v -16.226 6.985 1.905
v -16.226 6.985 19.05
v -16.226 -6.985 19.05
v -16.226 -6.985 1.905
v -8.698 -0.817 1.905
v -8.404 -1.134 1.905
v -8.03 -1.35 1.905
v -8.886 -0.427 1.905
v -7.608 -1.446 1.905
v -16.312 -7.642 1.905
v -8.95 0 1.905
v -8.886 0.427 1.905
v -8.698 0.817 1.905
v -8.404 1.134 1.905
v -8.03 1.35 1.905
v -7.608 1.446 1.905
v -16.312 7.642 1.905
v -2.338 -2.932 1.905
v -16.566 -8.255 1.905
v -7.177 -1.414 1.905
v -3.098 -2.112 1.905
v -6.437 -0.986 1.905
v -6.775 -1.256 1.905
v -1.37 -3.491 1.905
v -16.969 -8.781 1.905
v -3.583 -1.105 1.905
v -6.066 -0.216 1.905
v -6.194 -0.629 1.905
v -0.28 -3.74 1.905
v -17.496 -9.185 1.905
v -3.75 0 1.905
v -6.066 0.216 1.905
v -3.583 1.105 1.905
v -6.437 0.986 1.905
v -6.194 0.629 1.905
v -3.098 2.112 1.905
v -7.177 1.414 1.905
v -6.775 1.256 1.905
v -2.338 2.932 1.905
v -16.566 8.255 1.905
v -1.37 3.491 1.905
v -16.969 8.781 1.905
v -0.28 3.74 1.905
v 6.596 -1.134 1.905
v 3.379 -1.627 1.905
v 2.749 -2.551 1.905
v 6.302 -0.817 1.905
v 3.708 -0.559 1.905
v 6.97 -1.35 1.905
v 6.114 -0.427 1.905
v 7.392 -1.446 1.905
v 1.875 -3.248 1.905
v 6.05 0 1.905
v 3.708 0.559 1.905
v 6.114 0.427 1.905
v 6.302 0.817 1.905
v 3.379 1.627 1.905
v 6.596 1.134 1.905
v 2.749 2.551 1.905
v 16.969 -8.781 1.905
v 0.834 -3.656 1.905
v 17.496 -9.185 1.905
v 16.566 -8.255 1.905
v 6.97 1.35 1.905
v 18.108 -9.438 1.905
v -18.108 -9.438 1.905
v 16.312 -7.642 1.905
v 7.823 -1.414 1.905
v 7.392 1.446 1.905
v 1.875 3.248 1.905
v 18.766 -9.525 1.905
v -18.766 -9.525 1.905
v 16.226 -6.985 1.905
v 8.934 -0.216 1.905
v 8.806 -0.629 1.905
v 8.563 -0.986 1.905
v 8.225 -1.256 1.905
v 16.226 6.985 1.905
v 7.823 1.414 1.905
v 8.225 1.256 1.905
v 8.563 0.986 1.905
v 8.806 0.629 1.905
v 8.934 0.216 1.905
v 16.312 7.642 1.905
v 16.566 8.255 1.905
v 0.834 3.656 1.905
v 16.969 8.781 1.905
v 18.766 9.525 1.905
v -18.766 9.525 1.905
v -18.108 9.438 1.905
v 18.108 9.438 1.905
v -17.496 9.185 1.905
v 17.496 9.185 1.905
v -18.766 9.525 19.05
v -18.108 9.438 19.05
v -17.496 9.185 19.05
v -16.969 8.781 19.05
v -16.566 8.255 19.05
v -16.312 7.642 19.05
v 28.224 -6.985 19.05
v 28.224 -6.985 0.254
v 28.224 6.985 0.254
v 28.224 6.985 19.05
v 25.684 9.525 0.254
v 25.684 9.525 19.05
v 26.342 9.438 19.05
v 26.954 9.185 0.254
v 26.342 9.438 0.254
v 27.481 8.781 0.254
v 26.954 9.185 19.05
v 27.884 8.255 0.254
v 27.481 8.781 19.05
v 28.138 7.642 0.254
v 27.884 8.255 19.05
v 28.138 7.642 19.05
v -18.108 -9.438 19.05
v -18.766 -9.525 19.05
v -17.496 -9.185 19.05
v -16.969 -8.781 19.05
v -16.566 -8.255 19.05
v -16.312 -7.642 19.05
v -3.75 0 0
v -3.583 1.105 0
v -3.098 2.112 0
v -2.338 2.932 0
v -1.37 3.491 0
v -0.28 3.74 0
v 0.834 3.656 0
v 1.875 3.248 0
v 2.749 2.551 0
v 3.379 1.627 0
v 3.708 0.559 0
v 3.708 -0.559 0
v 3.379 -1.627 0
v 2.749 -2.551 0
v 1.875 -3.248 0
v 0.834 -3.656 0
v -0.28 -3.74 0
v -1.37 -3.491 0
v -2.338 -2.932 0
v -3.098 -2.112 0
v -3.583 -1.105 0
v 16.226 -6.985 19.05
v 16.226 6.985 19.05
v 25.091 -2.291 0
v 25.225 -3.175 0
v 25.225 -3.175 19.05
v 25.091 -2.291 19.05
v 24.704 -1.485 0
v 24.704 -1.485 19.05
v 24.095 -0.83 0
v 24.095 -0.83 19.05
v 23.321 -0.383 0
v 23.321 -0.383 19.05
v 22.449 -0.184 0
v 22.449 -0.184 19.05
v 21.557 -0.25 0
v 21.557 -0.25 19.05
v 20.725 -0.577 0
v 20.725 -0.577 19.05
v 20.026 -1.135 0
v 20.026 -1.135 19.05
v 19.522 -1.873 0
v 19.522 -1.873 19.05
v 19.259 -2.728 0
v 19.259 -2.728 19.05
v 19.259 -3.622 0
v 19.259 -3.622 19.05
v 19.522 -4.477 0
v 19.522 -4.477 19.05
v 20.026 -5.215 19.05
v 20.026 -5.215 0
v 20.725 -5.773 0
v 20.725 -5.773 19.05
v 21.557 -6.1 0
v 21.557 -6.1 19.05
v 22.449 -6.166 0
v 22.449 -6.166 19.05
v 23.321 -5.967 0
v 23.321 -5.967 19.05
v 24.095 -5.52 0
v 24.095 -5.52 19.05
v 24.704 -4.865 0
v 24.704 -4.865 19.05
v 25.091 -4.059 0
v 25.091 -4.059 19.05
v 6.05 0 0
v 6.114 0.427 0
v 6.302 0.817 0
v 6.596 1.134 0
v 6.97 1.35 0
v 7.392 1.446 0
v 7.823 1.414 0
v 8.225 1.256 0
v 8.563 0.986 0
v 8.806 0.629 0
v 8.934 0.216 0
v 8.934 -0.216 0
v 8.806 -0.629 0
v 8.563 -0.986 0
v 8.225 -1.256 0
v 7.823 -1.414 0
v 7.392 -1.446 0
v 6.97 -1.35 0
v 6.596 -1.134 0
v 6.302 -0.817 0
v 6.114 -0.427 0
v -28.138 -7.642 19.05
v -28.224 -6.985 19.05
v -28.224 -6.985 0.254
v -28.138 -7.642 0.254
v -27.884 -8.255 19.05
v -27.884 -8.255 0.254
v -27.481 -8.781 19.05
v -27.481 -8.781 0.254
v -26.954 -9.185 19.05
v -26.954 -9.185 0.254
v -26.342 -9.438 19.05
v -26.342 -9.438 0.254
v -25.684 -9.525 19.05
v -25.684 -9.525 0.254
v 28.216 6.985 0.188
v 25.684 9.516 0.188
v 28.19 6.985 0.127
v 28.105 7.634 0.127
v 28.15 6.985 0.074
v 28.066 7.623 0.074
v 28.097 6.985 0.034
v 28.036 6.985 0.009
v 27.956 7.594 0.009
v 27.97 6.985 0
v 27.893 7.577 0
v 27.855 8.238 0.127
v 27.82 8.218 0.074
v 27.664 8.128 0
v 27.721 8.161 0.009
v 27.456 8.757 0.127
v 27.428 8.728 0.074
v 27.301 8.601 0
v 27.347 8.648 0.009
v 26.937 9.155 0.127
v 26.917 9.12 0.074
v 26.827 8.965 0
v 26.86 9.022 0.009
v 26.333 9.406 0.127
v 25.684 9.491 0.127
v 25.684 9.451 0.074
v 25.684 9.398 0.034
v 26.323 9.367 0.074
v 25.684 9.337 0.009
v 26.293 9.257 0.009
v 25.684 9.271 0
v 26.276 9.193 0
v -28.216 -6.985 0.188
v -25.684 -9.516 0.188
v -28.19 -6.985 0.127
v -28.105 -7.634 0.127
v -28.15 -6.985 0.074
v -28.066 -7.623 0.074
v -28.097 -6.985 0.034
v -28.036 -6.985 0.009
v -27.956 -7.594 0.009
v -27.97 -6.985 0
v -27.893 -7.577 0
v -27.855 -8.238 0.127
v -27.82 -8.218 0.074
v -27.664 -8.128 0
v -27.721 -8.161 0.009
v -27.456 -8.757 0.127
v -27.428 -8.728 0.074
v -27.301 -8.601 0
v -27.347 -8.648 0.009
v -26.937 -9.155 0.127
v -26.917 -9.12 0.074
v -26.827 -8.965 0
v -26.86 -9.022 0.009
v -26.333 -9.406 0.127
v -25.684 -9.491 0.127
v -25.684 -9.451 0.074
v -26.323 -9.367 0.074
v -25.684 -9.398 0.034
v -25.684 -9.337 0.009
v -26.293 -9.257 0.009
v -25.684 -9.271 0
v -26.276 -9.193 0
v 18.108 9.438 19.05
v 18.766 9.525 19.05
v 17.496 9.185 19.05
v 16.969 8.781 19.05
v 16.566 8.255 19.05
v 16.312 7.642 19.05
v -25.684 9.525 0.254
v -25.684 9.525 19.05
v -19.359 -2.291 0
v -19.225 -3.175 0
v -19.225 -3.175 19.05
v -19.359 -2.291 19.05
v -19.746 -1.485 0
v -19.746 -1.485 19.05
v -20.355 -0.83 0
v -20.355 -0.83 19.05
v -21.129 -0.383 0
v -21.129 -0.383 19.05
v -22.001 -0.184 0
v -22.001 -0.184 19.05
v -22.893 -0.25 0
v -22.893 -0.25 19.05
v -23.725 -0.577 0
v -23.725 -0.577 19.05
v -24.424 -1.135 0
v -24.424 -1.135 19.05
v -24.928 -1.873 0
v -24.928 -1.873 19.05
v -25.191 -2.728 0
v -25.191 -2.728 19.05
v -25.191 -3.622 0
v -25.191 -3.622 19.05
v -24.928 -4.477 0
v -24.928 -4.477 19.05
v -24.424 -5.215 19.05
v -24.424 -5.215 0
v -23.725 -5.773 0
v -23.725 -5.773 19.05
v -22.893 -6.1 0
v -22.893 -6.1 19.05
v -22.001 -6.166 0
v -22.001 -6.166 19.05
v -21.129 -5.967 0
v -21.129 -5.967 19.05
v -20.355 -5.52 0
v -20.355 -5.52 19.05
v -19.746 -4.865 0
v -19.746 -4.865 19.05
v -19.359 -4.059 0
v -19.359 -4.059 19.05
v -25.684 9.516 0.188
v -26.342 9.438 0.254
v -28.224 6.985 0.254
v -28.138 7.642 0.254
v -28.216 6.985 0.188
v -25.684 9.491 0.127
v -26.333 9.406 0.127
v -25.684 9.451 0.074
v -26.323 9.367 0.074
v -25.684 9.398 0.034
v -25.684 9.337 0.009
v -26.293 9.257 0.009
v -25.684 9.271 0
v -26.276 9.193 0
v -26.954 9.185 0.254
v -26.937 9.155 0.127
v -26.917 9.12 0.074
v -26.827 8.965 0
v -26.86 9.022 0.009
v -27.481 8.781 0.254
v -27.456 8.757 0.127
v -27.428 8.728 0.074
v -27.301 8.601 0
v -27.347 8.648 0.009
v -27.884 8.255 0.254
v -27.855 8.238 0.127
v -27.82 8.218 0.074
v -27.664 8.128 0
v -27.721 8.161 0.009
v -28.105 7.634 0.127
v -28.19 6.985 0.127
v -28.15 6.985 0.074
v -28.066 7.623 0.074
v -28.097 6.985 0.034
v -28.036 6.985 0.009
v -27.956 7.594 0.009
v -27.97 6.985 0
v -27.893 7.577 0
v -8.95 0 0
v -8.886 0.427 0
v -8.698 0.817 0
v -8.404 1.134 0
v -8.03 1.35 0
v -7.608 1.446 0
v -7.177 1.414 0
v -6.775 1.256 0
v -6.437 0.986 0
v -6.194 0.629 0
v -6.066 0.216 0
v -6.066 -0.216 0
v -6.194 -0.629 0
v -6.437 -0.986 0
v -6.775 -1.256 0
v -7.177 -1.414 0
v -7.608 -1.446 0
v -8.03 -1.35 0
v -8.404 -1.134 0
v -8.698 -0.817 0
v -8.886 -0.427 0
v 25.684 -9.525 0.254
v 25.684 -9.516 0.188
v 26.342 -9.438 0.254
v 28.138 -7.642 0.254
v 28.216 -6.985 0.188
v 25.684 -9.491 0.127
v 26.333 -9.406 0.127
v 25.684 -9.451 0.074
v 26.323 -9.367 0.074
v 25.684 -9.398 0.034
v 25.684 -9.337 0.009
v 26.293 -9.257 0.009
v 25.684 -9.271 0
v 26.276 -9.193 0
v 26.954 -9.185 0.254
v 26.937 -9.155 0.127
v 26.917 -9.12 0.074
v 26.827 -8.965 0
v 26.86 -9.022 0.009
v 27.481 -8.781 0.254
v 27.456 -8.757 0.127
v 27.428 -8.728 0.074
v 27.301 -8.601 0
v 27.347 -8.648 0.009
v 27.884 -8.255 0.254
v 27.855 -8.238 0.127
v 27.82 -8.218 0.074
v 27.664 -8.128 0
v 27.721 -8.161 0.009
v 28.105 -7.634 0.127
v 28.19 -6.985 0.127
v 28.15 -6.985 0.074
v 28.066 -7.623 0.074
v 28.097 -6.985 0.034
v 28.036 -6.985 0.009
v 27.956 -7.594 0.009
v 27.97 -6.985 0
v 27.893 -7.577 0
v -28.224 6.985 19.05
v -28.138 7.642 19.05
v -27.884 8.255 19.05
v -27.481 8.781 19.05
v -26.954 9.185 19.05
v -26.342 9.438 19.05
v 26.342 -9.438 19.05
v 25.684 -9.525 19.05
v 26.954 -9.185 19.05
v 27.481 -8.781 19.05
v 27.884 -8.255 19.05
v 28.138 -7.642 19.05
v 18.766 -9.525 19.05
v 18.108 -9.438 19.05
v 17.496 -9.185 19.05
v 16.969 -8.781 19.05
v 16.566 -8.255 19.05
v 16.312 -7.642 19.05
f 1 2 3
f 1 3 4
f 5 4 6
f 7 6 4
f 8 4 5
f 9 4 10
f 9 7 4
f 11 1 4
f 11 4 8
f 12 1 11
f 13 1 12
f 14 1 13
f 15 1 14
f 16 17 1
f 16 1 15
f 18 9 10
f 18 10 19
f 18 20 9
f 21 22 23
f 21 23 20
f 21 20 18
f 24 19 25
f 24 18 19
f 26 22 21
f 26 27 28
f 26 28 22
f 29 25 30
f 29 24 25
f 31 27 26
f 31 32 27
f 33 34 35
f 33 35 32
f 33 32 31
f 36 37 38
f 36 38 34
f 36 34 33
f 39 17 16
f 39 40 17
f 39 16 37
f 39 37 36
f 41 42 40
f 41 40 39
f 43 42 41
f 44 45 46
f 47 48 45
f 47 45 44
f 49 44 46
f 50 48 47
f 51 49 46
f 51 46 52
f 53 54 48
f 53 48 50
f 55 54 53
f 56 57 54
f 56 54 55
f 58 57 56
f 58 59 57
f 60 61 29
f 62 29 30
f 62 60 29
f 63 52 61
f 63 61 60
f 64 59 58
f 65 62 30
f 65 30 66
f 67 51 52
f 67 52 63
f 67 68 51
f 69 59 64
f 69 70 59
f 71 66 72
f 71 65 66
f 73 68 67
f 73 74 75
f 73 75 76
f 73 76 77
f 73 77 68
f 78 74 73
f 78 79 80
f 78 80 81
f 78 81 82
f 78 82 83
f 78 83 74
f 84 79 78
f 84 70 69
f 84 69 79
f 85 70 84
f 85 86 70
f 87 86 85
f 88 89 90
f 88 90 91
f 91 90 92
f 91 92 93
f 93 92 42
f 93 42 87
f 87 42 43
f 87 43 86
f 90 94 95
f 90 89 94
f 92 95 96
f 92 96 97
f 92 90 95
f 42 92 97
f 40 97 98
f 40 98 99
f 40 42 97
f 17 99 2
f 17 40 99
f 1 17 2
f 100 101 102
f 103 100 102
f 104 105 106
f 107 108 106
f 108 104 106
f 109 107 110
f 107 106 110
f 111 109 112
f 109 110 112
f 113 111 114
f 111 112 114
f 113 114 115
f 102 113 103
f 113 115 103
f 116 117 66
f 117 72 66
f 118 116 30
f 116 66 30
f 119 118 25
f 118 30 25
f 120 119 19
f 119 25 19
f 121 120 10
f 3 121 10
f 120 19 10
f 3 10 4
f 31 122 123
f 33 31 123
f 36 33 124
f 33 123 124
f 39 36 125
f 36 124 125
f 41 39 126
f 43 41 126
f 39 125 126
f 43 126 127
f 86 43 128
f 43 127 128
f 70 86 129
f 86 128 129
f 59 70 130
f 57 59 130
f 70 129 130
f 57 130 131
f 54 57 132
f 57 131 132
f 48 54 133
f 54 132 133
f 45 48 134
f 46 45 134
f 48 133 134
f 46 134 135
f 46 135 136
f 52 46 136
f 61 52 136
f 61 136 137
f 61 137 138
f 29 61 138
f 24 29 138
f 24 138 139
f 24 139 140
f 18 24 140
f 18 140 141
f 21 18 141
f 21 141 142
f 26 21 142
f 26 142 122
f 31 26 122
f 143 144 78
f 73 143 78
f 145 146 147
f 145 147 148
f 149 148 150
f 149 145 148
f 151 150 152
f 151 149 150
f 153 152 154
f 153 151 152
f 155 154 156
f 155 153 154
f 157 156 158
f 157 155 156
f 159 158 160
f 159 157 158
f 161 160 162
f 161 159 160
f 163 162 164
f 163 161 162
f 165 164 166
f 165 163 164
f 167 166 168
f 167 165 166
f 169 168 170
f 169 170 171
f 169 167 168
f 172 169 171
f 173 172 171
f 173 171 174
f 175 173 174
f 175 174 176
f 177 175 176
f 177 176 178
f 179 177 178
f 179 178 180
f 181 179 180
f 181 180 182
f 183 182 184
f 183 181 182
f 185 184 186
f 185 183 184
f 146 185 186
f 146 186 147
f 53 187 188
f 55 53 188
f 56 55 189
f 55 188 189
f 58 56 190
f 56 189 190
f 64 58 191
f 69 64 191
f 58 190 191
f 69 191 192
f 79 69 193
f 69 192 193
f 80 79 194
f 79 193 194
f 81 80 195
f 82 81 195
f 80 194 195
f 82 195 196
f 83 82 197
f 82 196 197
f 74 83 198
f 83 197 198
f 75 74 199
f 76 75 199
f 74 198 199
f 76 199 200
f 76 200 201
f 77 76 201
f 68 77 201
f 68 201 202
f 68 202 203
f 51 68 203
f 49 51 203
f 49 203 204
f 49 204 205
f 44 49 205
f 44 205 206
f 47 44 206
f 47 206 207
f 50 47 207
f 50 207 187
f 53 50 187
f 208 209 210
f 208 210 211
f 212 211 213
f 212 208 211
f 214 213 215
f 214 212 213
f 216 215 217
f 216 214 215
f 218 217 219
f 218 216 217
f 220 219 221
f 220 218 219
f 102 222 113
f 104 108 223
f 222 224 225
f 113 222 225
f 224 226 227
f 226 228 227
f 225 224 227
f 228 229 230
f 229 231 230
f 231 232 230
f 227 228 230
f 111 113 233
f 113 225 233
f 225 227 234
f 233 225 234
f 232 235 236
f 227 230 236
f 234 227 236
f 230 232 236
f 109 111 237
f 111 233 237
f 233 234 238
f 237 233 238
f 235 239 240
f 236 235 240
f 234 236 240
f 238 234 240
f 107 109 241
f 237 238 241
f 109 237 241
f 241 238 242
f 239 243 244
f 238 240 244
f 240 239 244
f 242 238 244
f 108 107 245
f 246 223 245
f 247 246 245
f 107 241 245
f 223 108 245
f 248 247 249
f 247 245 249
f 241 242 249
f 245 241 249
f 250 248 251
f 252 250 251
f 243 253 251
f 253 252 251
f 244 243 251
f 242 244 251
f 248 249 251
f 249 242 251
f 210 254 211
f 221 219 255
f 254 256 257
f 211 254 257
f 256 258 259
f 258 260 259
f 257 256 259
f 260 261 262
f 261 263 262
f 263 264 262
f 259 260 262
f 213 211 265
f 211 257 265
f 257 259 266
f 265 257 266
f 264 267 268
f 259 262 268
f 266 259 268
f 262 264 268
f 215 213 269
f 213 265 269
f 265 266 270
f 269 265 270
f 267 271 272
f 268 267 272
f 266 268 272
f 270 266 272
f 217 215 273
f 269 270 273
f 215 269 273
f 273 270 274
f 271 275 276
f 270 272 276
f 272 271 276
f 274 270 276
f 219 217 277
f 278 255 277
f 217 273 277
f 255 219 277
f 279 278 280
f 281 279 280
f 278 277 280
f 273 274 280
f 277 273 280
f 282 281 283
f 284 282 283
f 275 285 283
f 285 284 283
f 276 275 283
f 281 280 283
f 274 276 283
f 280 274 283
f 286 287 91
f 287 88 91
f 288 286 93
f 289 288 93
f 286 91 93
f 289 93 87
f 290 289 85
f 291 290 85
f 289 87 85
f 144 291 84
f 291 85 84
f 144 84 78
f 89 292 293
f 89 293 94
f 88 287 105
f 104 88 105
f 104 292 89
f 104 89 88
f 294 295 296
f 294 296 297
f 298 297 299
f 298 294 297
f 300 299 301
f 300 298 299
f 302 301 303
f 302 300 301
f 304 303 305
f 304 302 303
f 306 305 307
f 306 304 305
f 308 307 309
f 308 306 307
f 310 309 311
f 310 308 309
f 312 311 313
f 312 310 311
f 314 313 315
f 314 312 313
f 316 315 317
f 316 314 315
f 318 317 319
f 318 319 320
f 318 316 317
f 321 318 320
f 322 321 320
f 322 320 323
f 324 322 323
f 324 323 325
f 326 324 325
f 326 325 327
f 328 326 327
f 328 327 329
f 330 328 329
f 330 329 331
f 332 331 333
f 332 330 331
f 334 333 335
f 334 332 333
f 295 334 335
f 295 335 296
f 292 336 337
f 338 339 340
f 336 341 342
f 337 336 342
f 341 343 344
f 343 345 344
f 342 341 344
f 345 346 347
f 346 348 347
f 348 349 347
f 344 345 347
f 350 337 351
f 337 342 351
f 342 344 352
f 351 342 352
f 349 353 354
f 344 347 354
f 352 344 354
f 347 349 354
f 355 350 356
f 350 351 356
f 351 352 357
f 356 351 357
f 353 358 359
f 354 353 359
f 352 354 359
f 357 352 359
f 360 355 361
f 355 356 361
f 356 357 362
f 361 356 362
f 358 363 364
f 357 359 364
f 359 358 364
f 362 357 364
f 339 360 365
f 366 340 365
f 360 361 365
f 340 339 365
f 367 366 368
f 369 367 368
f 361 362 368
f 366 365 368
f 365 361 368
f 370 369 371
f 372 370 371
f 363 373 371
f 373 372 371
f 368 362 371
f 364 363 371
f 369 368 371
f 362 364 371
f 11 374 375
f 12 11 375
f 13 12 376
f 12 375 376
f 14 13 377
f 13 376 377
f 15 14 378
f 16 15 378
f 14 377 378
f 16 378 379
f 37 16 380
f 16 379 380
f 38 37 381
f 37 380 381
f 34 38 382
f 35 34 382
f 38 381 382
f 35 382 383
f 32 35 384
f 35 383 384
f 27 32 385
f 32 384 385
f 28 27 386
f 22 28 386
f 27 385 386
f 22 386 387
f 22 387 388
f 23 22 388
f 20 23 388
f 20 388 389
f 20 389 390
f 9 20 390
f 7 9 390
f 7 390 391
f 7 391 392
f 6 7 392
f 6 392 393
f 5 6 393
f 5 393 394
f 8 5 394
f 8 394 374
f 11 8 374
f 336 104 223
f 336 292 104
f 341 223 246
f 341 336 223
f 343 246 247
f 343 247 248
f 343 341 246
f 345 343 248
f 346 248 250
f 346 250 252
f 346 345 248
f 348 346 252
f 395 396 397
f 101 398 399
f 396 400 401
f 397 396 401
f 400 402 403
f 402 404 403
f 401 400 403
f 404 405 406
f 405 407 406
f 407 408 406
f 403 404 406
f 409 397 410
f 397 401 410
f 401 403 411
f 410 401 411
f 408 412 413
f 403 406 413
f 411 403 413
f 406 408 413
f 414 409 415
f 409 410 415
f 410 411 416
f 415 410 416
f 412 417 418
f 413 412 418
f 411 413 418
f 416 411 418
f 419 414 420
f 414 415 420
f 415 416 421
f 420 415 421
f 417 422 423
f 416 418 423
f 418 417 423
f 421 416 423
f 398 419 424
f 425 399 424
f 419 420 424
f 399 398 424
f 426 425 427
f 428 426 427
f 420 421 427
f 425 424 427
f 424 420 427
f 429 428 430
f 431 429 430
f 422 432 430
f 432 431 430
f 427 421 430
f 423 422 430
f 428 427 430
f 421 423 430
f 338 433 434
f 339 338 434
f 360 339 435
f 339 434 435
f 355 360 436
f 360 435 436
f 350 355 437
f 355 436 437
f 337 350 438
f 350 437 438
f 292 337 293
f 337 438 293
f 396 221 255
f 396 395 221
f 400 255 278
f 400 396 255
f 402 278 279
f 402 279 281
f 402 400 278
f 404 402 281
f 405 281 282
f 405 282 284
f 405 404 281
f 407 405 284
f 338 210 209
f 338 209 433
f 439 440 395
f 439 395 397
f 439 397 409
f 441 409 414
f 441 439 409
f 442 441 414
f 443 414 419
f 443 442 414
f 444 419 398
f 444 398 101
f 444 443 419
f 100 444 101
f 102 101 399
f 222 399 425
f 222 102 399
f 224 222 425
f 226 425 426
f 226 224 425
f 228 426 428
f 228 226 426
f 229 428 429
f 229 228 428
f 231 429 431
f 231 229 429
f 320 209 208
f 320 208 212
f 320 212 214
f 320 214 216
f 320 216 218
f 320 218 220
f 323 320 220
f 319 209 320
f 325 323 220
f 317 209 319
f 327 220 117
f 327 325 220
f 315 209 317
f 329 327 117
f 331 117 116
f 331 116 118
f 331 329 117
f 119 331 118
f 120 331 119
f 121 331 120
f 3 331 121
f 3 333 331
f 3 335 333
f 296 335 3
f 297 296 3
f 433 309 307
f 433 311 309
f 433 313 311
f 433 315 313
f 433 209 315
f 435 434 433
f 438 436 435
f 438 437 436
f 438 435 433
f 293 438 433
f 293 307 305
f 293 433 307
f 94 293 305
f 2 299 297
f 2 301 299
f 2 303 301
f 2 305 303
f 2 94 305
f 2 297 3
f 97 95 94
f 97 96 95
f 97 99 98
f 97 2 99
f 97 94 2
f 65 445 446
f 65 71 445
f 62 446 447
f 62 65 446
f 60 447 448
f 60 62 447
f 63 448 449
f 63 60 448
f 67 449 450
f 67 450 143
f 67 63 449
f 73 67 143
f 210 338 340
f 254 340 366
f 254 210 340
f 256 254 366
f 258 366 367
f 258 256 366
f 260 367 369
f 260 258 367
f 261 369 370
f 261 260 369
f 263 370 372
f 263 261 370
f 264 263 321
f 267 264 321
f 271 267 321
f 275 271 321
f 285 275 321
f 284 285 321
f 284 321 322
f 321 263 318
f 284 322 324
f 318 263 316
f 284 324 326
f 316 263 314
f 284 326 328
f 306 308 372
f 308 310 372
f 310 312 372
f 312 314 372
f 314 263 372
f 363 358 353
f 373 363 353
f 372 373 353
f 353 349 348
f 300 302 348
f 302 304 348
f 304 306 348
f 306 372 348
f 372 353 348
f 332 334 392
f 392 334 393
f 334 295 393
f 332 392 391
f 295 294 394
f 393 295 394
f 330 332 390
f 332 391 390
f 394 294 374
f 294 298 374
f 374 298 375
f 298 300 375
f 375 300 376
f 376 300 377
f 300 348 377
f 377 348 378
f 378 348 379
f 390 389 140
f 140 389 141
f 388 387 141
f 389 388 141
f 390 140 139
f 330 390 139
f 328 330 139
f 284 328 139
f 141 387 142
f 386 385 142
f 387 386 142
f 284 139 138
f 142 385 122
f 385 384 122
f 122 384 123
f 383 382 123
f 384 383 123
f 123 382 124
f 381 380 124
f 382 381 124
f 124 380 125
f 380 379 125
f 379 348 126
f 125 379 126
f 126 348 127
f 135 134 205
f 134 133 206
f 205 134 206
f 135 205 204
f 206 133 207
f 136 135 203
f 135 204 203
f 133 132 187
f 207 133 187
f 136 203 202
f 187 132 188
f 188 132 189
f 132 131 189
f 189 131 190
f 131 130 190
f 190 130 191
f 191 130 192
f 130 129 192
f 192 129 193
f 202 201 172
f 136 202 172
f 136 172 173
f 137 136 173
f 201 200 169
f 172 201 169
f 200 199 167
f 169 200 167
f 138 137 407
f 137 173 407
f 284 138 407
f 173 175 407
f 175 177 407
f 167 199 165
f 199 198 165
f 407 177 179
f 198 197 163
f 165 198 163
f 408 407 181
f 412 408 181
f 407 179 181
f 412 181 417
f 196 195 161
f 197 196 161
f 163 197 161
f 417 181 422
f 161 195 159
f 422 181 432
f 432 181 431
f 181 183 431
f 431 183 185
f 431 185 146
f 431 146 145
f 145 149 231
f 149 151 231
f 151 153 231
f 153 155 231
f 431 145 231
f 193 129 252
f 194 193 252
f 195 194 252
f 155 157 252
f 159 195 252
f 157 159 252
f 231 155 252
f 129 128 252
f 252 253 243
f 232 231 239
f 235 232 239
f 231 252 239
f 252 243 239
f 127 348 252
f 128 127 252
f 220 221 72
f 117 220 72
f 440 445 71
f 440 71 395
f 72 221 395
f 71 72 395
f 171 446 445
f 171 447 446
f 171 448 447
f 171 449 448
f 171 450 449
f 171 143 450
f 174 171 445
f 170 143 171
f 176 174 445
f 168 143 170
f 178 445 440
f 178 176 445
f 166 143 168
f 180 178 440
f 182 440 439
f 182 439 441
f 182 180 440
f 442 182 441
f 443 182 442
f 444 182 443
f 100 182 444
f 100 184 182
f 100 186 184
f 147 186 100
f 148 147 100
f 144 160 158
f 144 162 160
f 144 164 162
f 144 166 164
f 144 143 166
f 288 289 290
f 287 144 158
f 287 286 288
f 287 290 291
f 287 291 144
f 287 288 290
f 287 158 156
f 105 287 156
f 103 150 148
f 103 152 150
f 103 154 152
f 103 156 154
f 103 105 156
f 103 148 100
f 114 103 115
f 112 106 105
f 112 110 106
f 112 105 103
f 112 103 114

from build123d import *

# Parameters (mm, degrees)
SKETCH1_W           = 56.44896
SKETCH1_H           = 19.05
SKETCH1_R           = 2.99974
BOSS_EXTRUDE1_DEPTH = 19.05
SKETCH2_R           = 1.45
SKETCH2_R_2         = 3.75
CUT_EXTRUDE1_DEPTH  = 19.05
SKETCH3_W           = 32.45104
SKETCH3_H           = 17.145
CUT_EXTRUDE2_DEPTH  = 19.05
FILLET1_R           = 2.54
FILLET3_R           = 0.254


with BuildPart() as part:
    # Sketch1 → Boss-Extrude1 (new body)
    with BuildSketch(Plane.XY):
        Rectangle(SKETCH1_W, SKETCH1_H)
        with Locations((-22.225, -3.175)):
            Circle(SKETCH1_R, mode=Mode.SUBTRACT)
        with Locations((22.225, -3.175)):
            Circle(SKETCH1_R, mode=Mode.SUBTRACT)
    extrude(amount=BOSS_EXTRUDE1_DEPTH)

    # Sketch2 → Cut-Extrude1 (cut)
    with BuildSketch(Plane(origin=(0, 0, 0), x_dir=(-1, 0, 0), z_dir=(0, 0, -1))):
        with Locations((-7.5, 0)):
            Circle(SKETCH2_R)
        with Locations((7.5, 0)):
            Circle(SKETCH2_R)
        Circle(SKETCH2_R_2)
    extrude(amount=-CUT_EXTRUDE1_DEPTH, mode=Mode.SUBTRACT)

    # Sketch3 → Cut-Extrude2 (cut)
    with BuildSketch(Plane(origin=(0, 9.525, 0), x_dir=(1, 0, 0), z_dir=(0, 1, 0))):
        with Locations((0, -10.4775)):
            Rectangle(SKETCH3_W, SKETCH3_H)
    extrude(amount=-CUT_EXTRUDE2_DEPTH, mode=Mode.SUBTRACT)

    # Fillet1
    fillet1_edges = [part.edges().sort_by_distance(p)[0] for p in [
        (28.22448, -9.525, 9.525),
        (-28.22448, -9.525, 9.525),
        (-28.22448, 9.525, 9.525),
        (28.22448, 9.525, 9.525),
        (16.22552, -9.525, 10.4775),
        (16.22552, 9.525, 10.4775),
        (-16.22552, 9.525, 10.4775),
        (-16.22552, -9.525, 10.4775),
    ]]
    fillet(fillet1_edges, radius=FILLET1_R)

    # Fillet3
    fillet3_edges = [part.edges().sort_by_distance(p)[0] for p in [
        (0, -9.525, 0),
        (28.22448, 0, 0),
        (-28.22448, 0, 0),
        (0, 9.525, 0),
        (-27.480531224, 8.781051224, 0),
        (27.480531224, 8.781051224, 0),
        (27.480531224, -8.781051224, 0),
        (-27.480531224, -8.781051224, 0),
    ]]
    fillet(fillet3_edges, radius=FILLET3_R)


solid = part.part
